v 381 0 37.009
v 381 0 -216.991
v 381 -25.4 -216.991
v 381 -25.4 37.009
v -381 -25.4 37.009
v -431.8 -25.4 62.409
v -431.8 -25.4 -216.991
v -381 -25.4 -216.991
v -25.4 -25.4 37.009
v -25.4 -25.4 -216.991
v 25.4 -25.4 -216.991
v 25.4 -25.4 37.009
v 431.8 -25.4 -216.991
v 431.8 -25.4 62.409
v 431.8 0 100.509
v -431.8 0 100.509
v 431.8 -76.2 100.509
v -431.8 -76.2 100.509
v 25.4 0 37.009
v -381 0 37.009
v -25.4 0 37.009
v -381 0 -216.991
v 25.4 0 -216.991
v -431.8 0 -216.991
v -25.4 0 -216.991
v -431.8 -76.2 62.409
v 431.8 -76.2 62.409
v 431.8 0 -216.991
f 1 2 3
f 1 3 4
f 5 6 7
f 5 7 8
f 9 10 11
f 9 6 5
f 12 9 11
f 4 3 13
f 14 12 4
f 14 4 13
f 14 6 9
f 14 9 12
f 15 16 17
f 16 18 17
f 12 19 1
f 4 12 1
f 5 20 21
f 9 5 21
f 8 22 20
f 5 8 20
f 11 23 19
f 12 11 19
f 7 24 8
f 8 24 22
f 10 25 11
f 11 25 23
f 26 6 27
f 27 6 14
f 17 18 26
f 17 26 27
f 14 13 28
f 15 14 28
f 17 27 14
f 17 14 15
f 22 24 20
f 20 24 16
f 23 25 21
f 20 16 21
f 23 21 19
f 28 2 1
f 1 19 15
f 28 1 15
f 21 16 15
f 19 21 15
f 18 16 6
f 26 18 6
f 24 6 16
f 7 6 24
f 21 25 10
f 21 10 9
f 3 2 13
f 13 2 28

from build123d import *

# Parameters (mm, degrees)
F0_W          = 50.8
F0_H          = 254
F0_H_2        = 50.8
F1_DEPTH      = 25.4
F2_W          = 863.6
F2_H          = 12.7
F2_H_2        = 25.4
F3_DEPTH      = 50.8
F3_DEPTH_BACK = 25.4


with BuildPart() as f1:
    # F0 (on Front) → F1 (new body)
    with BuildSketch(Plane.XZ):
        with Locations((0, -89.99076)):
            Rectangle(F0_W, F0_H)
        Polygon((-25.4, 37.00924), (25.4, 37.00924), (381, 37.00924), (381, 87.80924), (-381, 87.80924), (-381, 37.00924), align=None)
        with Locations((406.4, 62.40924)):
            Rectangle(F0_W, F0_H_2)
        with Locations((406.4, -89.99076)):
            Rectangle(F0_W, F0_H)
        with Locations((-406.4, -89.99076)):
            Rectangle(F0_W, F0_H)
        with Locations((-406.4, 62.40924)):
            Rectangle(F0_W, F0_H_2)
    extrude(amount=F1_DEPTH)

    # F2 (on face) → F3 (join, two sides)
    with BuildSketch(Plane.XZ.offset(25.4)) as f3_sk:
        with Locations((0, 94.15924)):
            Rectangle(F2_W, F2_H)
        with Locations((0, 75.10924)):
            Rectangle(F2_W, F2_H_2)
    extrude(amount=F3_DEPTH)
    extrude(f3_sk.sketch, amount=-F3_DEPTH_BACK)


solid = f1.part
